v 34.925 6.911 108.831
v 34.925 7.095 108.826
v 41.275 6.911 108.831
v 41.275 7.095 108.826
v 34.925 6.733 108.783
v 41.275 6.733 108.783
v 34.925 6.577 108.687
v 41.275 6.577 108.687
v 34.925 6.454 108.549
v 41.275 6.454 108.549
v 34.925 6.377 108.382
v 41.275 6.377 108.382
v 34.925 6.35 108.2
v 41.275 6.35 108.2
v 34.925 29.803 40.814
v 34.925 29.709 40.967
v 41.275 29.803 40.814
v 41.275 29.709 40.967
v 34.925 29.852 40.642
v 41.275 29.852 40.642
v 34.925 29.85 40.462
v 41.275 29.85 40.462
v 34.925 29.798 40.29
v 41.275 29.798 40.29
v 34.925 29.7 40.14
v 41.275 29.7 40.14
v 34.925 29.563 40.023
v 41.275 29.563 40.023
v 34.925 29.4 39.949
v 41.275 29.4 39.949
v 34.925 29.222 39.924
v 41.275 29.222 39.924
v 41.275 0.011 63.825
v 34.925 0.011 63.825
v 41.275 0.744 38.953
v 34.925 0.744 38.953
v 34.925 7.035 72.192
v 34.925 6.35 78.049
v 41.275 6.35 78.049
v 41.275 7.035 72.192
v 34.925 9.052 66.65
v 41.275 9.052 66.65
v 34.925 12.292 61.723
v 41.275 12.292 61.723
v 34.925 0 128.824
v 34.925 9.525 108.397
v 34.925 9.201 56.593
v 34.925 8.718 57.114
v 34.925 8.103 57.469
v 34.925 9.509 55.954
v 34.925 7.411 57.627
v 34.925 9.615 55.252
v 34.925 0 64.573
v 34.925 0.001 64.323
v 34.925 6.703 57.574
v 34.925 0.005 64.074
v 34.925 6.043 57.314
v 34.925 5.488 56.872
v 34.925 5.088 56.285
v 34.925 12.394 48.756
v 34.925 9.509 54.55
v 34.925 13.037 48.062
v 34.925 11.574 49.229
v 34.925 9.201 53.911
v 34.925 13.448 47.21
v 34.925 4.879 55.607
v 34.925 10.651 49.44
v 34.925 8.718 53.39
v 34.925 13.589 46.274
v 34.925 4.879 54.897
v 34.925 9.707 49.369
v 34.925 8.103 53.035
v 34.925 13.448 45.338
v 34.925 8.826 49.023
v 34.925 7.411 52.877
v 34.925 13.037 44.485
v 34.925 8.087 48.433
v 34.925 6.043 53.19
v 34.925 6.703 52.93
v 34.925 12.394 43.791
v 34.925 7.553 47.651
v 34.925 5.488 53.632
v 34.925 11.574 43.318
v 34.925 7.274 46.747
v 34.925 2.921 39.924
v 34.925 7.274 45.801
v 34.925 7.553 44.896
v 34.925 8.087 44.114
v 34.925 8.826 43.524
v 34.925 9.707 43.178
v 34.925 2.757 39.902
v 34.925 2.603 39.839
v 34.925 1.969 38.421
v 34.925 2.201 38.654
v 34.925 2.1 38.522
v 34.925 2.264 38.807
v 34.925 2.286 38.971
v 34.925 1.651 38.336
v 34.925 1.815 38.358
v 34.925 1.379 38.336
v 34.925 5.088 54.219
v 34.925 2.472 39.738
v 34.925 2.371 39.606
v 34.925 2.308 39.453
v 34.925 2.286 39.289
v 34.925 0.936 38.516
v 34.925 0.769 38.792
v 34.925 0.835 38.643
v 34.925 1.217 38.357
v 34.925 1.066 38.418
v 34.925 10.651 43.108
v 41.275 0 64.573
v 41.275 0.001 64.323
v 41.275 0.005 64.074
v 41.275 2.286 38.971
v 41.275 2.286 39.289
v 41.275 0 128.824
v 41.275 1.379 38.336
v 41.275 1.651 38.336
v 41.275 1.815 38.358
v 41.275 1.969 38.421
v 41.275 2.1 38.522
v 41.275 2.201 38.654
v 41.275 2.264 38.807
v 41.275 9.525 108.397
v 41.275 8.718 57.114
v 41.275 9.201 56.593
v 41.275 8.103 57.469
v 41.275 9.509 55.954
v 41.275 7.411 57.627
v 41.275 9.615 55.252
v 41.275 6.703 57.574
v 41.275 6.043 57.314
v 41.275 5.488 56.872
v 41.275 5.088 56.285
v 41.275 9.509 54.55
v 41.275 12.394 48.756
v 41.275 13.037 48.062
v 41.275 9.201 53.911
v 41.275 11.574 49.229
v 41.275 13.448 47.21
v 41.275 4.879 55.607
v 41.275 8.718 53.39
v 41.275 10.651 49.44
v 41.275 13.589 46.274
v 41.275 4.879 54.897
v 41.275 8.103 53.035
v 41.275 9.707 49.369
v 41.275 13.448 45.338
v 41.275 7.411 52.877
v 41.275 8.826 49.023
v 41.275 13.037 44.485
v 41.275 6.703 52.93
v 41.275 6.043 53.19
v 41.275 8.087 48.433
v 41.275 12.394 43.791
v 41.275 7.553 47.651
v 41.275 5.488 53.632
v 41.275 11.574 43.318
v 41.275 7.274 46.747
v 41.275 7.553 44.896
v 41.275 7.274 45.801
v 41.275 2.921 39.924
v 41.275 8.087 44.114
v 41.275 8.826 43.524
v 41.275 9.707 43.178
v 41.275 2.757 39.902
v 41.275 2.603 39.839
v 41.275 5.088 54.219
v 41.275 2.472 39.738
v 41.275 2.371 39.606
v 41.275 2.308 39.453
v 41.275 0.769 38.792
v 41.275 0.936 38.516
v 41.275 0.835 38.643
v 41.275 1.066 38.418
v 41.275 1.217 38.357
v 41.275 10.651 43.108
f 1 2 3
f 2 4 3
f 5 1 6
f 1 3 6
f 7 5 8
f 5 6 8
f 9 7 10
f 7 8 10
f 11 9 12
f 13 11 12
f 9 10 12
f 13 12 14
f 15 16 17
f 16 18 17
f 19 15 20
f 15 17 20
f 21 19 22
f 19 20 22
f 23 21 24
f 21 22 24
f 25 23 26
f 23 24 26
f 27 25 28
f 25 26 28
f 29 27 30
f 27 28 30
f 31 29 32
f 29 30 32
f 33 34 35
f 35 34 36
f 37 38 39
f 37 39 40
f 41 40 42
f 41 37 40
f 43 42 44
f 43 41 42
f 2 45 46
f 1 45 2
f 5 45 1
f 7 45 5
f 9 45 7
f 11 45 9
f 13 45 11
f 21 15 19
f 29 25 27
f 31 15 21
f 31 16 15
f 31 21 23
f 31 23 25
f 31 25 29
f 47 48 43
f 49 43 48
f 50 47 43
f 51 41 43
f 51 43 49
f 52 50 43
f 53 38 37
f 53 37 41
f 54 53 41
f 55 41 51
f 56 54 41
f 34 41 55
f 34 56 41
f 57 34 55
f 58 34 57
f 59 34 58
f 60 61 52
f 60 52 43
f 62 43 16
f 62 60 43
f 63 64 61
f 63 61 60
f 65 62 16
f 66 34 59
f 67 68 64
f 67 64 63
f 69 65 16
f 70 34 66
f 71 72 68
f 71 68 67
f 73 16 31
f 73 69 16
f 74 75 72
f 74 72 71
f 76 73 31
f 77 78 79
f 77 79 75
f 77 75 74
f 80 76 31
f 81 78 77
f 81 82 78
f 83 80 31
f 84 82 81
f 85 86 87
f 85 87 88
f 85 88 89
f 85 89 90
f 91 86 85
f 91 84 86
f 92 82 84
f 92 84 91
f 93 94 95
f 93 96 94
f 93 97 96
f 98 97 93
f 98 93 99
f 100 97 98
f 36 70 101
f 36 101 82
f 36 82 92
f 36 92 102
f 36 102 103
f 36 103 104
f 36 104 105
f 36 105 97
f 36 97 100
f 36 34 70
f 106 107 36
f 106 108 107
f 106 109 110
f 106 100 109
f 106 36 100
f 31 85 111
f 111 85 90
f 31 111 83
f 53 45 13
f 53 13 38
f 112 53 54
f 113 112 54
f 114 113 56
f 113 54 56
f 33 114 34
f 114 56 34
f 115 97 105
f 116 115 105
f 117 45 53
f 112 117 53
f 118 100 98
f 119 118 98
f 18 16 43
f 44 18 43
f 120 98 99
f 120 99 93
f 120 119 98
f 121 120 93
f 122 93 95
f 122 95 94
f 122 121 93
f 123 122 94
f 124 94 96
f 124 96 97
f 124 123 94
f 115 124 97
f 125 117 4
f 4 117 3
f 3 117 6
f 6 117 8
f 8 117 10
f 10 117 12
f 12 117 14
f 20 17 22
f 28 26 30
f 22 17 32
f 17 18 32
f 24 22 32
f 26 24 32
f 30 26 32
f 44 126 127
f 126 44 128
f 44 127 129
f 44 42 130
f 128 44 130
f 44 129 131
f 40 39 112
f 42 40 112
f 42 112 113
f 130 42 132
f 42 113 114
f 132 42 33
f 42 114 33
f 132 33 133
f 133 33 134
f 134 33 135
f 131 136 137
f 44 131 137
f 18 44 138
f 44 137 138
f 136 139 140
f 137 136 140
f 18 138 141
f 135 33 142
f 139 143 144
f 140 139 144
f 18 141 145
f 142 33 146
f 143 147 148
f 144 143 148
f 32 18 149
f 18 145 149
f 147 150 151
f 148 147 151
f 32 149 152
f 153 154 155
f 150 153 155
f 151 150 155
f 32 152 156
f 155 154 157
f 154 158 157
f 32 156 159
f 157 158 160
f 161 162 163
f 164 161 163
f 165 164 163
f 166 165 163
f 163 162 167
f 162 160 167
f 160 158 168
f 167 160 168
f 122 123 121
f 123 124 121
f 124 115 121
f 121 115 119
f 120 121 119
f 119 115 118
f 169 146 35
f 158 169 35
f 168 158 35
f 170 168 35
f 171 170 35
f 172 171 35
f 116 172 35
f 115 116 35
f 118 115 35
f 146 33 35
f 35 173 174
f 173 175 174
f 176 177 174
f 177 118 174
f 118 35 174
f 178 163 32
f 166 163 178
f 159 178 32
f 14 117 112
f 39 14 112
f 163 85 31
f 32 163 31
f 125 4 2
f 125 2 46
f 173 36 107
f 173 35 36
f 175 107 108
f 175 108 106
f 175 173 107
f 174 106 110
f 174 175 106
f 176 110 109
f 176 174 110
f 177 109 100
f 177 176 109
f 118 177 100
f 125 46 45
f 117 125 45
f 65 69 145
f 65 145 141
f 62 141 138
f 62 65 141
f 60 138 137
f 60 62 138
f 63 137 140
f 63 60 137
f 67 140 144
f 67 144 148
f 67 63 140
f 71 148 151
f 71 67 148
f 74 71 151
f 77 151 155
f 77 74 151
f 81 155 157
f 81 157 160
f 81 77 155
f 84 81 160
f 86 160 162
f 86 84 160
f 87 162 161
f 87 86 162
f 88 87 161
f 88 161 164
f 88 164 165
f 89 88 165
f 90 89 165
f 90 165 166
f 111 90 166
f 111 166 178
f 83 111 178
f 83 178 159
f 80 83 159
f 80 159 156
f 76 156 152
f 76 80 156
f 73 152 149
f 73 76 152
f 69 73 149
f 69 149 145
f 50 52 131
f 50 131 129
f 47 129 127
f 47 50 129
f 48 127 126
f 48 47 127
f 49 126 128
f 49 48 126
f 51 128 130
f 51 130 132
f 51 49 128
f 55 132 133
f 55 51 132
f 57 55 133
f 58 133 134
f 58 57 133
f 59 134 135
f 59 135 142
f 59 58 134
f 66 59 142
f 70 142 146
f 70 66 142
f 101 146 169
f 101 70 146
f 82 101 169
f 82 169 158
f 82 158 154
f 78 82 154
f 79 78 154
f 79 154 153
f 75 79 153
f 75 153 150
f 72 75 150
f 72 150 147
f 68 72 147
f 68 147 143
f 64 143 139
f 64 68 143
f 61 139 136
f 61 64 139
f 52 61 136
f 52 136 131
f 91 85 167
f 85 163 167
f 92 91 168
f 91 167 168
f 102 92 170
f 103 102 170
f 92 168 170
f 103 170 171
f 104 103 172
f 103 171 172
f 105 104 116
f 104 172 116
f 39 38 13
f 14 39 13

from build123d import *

# Parameters (mm, degrees)
STOCK_BEE_ZERKER_START                       = 34.925
STOCK_BEE_ZERKER_2_0_MULTIBODY_1_OUTLINE_R   = 2.38125
STOCK_BEE_ZERKER_2_0_MULTIBODY_1_OUTLINE_R_2 = 3.175
STOCK_BEE_ZERKER_2_0_MULTIBODY_1_DEPTH       = 6.35
FILLET1_R                                    = 0.635
FILLET2_R                                    = 25.4


# Read off the part's stored shape, not the designer's step: Stock-Bee-zerker 2.0 Multibody-1
with BuildPart() as part:
    # Stock-Bee-zerker 2.0 Multibody-1 outline → Stock-Bee-zerker 2.0 Multibody-1 (new body)
    with BuildSketch(Plane.YZ.offset(STOCK_BEE_ZERKER_START)):
        Polygon((9.525, 108.397291582), (0, 128.82372), (0, 64.1985), (0.762, 38.33622), (2.286, 38.33622), (2.286, 39.92372), (30.58384403, 39.92372), (6.35, 68.804490685), (6.35, 108.957129746), align=None)
        with Locations((7.233375897, 55.251985719)):
            Circle(STOCK_BEE_ZERKER_2_0_MULTIBODY_1_OUTLINE_R, mode=Mode.SUBTRACT)
        with Locations((10.414, 46.27372)):
            Circle(STOCK_BEE_ZERKER_2_0_MULTIBODY_1_OUTLINE_R_2, mode=Mode.SUBTRACT)
    extrude(amount=STOCK_BEE_ZERKER_2_0_MULTIBODY_1_DEPTH)

    # Fillet1
    fillet1_edges = [part.edges().sort_by_distance(p)[0] for p in [
        (38.1, 6.35, 108.957129746),
        (38.1, 30.58384403, 39.92372),
        (38.1, 2.286, 39.92372),
        (38.1, 2.286, 38.33622),
        (38.1, 0.762, 38.33622),
    ]]
    fillet(fillet1_edges, radius=FILLET1_R)

    # Fillet2
    # the kernel refuses this fillet: 25.4 mm, written as the material it adds along each edge
    with BuildSketch(Plane(origin=(34.925, 6.35, 68.804490685), x_dir=(0, 0, 1), z_dir=(1, 0, 0))) as fillet2_piece_1:
        with BuildLine():
            CenterArc((FILLET2_R * 0.363970234267, -FILLET2_R), FILLET2_R, 90, 40)
            Line((-FILLET2_R * 0.278817375421, -FILLET2_R * 0.233955556882), (0, 0))
            Line((0, 0), (FILLET2_R * 0.363970234267, 0))
        make_face()
    extrude(amount=6.35)
    # the kernel refuses this fillet: 25.4 mm, written as the material it takes off along each edge
    with BuildSketch(Plane(origin=(33.98972857, 0, 64.1985), x_dir=(0, 0.029450978958150506, -0.9995662258391919), z_dir=(1, 0, 0))) as fillet2_2_piece_1:
        with BuildLine():
            CenterArc((FILLET2_R * 0.0147286839403, FILLET2_R), FILLET2_R, 268.312339175, 1.687660825)
            Line((-FILLET2_R * 0.0147222950178, FILLET2_R * 0.000433774160808), (0, 0))
            Line((0, 0), (FILLET2_R * 0.0147286839403, 0))
        make_face()
    extrude(amount=8.22054286, mode=Mode.SUBTRACT)


solid = part.part
